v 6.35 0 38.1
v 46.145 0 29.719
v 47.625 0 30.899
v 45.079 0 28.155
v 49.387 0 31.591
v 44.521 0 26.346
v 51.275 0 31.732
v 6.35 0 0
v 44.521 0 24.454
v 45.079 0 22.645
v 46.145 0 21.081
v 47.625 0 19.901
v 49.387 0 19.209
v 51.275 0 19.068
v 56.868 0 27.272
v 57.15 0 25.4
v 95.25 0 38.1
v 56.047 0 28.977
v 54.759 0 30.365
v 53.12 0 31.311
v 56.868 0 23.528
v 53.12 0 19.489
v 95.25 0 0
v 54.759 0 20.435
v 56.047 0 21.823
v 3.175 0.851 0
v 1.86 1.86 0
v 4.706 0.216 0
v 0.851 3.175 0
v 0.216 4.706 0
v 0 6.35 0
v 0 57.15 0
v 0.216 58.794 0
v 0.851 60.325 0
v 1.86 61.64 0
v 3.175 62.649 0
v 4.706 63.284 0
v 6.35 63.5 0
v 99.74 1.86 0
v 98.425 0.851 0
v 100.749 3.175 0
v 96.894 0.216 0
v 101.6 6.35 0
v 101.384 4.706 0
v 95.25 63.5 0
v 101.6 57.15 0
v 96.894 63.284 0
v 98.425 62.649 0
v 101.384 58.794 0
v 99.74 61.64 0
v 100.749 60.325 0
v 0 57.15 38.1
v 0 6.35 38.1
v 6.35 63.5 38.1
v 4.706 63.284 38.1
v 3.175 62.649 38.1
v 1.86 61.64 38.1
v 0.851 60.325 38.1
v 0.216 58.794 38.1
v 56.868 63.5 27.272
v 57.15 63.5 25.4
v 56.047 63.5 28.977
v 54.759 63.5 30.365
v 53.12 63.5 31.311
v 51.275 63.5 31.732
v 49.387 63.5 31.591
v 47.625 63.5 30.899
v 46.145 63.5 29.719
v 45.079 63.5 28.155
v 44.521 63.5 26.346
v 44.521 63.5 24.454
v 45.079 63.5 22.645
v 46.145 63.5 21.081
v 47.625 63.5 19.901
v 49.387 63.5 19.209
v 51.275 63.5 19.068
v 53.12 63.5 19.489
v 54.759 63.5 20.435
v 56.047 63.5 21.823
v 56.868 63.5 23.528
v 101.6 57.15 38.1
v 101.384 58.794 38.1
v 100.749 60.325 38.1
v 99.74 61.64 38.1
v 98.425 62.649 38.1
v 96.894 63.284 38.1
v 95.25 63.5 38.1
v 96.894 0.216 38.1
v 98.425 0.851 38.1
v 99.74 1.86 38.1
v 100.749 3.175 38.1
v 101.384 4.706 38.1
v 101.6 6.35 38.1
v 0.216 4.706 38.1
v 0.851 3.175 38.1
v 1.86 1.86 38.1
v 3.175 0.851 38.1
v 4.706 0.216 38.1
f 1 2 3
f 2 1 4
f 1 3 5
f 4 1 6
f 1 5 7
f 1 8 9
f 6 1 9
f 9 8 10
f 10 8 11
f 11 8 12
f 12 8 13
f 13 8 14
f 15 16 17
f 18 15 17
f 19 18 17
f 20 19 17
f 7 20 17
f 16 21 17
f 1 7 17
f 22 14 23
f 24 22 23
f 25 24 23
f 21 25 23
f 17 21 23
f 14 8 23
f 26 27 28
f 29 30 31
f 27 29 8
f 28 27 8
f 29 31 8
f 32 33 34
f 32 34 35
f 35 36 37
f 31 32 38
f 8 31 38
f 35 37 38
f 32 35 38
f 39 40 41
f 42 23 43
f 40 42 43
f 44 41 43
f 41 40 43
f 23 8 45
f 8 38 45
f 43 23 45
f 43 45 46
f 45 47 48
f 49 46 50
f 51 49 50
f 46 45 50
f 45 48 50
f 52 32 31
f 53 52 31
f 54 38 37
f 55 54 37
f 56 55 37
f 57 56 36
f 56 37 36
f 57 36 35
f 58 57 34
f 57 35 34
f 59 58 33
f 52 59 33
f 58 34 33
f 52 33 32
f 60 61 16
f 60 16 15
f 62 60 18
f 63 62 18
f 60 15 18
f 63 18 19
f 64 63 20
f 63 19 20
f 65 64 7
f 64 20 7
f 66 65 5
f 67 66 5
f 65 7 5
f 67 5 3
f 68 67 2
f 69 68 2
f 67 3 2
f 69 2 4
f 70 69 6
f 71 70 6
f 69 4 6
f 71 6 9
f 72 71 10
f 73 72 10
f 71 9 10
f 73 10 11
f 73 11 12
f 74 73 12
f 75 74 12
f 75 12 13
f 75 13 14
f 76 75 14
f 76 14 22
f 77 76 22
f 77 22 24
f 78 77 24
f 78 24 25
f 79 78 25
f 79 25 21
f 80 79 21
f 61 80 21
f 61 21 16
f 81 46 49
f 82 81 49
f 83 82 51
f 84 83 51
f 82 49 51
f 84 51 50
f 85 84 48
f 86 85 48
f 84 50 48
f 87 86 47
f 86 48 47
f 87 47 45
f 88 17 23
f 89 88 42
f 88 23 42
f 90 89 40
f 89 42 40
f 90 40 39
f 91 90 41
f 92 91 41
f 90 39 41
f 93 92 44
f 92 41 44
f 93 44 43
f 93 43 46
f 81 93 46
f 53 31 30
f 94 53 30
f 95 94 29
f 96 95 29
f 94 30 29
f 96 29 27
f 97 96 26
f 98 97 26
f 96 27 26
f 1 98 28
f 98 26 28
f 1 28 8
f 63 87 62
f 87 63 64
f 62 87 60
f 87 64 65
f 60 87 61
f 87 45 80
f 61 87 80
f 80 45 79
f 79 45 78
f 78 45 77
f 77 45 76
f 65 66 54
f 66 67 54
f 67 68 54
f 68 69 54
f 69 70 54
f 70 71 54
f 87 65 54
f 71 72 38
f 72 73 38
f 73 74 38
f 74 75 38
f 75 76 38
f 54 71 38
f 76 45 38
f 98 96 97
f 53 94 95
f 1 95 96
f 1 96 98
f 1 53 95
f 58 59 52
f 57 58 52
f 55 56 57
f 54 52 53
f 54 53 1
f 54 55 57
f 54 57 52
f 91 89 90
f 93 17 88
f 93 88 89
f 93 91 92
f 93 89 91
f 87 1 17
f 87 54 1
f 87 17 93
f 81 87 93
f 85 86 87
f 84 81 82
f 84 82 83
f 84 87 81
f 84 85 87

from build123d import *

# Parameters (mm, degrees)
F1_DEPTH = 38.1
F2_R     = 6.35
F3_DEPTH = 63.501


with BuildPart() as f1:
    # F0 (on Top) → F1 (new body)
    with BuildSketch(Plane.XY):
        with BuildLine():
            ThreePointArc((0, 6.35), (1.859872, 1.859872), (6.35, 0))
            Line((6.35, 0), (95.25, 0))
            ThreePointArc((95.25, 0), (99.740128, 1.859872), (101.6, 6.35))
            Line((101.6, 6.35), (101.6, 57.15))
            ThreePointArc((101.6, 57.15), (99.740128, 61.640128), (95.25, 63.5))
            Line((95.25, 63.5), (6.35, 63.5))
            ThreePointArc((6.35, 63.5), (1.859872, 61.640128), (0, 57.15))
            Line((0, 57.15), (0, 6.35))
        make_face()
    extrude(amount=F1_DEPTH)

    # F2 (on face) → F3 (cut, through all)
    with BuildSketch(Plane.XZ):
        with Locations((50.8, 25.4)):
            Circle(F2_R)
    extrude(amount=-F3_DEPTH, mode=Mode.SUBTRACT)


solid = f1.part
